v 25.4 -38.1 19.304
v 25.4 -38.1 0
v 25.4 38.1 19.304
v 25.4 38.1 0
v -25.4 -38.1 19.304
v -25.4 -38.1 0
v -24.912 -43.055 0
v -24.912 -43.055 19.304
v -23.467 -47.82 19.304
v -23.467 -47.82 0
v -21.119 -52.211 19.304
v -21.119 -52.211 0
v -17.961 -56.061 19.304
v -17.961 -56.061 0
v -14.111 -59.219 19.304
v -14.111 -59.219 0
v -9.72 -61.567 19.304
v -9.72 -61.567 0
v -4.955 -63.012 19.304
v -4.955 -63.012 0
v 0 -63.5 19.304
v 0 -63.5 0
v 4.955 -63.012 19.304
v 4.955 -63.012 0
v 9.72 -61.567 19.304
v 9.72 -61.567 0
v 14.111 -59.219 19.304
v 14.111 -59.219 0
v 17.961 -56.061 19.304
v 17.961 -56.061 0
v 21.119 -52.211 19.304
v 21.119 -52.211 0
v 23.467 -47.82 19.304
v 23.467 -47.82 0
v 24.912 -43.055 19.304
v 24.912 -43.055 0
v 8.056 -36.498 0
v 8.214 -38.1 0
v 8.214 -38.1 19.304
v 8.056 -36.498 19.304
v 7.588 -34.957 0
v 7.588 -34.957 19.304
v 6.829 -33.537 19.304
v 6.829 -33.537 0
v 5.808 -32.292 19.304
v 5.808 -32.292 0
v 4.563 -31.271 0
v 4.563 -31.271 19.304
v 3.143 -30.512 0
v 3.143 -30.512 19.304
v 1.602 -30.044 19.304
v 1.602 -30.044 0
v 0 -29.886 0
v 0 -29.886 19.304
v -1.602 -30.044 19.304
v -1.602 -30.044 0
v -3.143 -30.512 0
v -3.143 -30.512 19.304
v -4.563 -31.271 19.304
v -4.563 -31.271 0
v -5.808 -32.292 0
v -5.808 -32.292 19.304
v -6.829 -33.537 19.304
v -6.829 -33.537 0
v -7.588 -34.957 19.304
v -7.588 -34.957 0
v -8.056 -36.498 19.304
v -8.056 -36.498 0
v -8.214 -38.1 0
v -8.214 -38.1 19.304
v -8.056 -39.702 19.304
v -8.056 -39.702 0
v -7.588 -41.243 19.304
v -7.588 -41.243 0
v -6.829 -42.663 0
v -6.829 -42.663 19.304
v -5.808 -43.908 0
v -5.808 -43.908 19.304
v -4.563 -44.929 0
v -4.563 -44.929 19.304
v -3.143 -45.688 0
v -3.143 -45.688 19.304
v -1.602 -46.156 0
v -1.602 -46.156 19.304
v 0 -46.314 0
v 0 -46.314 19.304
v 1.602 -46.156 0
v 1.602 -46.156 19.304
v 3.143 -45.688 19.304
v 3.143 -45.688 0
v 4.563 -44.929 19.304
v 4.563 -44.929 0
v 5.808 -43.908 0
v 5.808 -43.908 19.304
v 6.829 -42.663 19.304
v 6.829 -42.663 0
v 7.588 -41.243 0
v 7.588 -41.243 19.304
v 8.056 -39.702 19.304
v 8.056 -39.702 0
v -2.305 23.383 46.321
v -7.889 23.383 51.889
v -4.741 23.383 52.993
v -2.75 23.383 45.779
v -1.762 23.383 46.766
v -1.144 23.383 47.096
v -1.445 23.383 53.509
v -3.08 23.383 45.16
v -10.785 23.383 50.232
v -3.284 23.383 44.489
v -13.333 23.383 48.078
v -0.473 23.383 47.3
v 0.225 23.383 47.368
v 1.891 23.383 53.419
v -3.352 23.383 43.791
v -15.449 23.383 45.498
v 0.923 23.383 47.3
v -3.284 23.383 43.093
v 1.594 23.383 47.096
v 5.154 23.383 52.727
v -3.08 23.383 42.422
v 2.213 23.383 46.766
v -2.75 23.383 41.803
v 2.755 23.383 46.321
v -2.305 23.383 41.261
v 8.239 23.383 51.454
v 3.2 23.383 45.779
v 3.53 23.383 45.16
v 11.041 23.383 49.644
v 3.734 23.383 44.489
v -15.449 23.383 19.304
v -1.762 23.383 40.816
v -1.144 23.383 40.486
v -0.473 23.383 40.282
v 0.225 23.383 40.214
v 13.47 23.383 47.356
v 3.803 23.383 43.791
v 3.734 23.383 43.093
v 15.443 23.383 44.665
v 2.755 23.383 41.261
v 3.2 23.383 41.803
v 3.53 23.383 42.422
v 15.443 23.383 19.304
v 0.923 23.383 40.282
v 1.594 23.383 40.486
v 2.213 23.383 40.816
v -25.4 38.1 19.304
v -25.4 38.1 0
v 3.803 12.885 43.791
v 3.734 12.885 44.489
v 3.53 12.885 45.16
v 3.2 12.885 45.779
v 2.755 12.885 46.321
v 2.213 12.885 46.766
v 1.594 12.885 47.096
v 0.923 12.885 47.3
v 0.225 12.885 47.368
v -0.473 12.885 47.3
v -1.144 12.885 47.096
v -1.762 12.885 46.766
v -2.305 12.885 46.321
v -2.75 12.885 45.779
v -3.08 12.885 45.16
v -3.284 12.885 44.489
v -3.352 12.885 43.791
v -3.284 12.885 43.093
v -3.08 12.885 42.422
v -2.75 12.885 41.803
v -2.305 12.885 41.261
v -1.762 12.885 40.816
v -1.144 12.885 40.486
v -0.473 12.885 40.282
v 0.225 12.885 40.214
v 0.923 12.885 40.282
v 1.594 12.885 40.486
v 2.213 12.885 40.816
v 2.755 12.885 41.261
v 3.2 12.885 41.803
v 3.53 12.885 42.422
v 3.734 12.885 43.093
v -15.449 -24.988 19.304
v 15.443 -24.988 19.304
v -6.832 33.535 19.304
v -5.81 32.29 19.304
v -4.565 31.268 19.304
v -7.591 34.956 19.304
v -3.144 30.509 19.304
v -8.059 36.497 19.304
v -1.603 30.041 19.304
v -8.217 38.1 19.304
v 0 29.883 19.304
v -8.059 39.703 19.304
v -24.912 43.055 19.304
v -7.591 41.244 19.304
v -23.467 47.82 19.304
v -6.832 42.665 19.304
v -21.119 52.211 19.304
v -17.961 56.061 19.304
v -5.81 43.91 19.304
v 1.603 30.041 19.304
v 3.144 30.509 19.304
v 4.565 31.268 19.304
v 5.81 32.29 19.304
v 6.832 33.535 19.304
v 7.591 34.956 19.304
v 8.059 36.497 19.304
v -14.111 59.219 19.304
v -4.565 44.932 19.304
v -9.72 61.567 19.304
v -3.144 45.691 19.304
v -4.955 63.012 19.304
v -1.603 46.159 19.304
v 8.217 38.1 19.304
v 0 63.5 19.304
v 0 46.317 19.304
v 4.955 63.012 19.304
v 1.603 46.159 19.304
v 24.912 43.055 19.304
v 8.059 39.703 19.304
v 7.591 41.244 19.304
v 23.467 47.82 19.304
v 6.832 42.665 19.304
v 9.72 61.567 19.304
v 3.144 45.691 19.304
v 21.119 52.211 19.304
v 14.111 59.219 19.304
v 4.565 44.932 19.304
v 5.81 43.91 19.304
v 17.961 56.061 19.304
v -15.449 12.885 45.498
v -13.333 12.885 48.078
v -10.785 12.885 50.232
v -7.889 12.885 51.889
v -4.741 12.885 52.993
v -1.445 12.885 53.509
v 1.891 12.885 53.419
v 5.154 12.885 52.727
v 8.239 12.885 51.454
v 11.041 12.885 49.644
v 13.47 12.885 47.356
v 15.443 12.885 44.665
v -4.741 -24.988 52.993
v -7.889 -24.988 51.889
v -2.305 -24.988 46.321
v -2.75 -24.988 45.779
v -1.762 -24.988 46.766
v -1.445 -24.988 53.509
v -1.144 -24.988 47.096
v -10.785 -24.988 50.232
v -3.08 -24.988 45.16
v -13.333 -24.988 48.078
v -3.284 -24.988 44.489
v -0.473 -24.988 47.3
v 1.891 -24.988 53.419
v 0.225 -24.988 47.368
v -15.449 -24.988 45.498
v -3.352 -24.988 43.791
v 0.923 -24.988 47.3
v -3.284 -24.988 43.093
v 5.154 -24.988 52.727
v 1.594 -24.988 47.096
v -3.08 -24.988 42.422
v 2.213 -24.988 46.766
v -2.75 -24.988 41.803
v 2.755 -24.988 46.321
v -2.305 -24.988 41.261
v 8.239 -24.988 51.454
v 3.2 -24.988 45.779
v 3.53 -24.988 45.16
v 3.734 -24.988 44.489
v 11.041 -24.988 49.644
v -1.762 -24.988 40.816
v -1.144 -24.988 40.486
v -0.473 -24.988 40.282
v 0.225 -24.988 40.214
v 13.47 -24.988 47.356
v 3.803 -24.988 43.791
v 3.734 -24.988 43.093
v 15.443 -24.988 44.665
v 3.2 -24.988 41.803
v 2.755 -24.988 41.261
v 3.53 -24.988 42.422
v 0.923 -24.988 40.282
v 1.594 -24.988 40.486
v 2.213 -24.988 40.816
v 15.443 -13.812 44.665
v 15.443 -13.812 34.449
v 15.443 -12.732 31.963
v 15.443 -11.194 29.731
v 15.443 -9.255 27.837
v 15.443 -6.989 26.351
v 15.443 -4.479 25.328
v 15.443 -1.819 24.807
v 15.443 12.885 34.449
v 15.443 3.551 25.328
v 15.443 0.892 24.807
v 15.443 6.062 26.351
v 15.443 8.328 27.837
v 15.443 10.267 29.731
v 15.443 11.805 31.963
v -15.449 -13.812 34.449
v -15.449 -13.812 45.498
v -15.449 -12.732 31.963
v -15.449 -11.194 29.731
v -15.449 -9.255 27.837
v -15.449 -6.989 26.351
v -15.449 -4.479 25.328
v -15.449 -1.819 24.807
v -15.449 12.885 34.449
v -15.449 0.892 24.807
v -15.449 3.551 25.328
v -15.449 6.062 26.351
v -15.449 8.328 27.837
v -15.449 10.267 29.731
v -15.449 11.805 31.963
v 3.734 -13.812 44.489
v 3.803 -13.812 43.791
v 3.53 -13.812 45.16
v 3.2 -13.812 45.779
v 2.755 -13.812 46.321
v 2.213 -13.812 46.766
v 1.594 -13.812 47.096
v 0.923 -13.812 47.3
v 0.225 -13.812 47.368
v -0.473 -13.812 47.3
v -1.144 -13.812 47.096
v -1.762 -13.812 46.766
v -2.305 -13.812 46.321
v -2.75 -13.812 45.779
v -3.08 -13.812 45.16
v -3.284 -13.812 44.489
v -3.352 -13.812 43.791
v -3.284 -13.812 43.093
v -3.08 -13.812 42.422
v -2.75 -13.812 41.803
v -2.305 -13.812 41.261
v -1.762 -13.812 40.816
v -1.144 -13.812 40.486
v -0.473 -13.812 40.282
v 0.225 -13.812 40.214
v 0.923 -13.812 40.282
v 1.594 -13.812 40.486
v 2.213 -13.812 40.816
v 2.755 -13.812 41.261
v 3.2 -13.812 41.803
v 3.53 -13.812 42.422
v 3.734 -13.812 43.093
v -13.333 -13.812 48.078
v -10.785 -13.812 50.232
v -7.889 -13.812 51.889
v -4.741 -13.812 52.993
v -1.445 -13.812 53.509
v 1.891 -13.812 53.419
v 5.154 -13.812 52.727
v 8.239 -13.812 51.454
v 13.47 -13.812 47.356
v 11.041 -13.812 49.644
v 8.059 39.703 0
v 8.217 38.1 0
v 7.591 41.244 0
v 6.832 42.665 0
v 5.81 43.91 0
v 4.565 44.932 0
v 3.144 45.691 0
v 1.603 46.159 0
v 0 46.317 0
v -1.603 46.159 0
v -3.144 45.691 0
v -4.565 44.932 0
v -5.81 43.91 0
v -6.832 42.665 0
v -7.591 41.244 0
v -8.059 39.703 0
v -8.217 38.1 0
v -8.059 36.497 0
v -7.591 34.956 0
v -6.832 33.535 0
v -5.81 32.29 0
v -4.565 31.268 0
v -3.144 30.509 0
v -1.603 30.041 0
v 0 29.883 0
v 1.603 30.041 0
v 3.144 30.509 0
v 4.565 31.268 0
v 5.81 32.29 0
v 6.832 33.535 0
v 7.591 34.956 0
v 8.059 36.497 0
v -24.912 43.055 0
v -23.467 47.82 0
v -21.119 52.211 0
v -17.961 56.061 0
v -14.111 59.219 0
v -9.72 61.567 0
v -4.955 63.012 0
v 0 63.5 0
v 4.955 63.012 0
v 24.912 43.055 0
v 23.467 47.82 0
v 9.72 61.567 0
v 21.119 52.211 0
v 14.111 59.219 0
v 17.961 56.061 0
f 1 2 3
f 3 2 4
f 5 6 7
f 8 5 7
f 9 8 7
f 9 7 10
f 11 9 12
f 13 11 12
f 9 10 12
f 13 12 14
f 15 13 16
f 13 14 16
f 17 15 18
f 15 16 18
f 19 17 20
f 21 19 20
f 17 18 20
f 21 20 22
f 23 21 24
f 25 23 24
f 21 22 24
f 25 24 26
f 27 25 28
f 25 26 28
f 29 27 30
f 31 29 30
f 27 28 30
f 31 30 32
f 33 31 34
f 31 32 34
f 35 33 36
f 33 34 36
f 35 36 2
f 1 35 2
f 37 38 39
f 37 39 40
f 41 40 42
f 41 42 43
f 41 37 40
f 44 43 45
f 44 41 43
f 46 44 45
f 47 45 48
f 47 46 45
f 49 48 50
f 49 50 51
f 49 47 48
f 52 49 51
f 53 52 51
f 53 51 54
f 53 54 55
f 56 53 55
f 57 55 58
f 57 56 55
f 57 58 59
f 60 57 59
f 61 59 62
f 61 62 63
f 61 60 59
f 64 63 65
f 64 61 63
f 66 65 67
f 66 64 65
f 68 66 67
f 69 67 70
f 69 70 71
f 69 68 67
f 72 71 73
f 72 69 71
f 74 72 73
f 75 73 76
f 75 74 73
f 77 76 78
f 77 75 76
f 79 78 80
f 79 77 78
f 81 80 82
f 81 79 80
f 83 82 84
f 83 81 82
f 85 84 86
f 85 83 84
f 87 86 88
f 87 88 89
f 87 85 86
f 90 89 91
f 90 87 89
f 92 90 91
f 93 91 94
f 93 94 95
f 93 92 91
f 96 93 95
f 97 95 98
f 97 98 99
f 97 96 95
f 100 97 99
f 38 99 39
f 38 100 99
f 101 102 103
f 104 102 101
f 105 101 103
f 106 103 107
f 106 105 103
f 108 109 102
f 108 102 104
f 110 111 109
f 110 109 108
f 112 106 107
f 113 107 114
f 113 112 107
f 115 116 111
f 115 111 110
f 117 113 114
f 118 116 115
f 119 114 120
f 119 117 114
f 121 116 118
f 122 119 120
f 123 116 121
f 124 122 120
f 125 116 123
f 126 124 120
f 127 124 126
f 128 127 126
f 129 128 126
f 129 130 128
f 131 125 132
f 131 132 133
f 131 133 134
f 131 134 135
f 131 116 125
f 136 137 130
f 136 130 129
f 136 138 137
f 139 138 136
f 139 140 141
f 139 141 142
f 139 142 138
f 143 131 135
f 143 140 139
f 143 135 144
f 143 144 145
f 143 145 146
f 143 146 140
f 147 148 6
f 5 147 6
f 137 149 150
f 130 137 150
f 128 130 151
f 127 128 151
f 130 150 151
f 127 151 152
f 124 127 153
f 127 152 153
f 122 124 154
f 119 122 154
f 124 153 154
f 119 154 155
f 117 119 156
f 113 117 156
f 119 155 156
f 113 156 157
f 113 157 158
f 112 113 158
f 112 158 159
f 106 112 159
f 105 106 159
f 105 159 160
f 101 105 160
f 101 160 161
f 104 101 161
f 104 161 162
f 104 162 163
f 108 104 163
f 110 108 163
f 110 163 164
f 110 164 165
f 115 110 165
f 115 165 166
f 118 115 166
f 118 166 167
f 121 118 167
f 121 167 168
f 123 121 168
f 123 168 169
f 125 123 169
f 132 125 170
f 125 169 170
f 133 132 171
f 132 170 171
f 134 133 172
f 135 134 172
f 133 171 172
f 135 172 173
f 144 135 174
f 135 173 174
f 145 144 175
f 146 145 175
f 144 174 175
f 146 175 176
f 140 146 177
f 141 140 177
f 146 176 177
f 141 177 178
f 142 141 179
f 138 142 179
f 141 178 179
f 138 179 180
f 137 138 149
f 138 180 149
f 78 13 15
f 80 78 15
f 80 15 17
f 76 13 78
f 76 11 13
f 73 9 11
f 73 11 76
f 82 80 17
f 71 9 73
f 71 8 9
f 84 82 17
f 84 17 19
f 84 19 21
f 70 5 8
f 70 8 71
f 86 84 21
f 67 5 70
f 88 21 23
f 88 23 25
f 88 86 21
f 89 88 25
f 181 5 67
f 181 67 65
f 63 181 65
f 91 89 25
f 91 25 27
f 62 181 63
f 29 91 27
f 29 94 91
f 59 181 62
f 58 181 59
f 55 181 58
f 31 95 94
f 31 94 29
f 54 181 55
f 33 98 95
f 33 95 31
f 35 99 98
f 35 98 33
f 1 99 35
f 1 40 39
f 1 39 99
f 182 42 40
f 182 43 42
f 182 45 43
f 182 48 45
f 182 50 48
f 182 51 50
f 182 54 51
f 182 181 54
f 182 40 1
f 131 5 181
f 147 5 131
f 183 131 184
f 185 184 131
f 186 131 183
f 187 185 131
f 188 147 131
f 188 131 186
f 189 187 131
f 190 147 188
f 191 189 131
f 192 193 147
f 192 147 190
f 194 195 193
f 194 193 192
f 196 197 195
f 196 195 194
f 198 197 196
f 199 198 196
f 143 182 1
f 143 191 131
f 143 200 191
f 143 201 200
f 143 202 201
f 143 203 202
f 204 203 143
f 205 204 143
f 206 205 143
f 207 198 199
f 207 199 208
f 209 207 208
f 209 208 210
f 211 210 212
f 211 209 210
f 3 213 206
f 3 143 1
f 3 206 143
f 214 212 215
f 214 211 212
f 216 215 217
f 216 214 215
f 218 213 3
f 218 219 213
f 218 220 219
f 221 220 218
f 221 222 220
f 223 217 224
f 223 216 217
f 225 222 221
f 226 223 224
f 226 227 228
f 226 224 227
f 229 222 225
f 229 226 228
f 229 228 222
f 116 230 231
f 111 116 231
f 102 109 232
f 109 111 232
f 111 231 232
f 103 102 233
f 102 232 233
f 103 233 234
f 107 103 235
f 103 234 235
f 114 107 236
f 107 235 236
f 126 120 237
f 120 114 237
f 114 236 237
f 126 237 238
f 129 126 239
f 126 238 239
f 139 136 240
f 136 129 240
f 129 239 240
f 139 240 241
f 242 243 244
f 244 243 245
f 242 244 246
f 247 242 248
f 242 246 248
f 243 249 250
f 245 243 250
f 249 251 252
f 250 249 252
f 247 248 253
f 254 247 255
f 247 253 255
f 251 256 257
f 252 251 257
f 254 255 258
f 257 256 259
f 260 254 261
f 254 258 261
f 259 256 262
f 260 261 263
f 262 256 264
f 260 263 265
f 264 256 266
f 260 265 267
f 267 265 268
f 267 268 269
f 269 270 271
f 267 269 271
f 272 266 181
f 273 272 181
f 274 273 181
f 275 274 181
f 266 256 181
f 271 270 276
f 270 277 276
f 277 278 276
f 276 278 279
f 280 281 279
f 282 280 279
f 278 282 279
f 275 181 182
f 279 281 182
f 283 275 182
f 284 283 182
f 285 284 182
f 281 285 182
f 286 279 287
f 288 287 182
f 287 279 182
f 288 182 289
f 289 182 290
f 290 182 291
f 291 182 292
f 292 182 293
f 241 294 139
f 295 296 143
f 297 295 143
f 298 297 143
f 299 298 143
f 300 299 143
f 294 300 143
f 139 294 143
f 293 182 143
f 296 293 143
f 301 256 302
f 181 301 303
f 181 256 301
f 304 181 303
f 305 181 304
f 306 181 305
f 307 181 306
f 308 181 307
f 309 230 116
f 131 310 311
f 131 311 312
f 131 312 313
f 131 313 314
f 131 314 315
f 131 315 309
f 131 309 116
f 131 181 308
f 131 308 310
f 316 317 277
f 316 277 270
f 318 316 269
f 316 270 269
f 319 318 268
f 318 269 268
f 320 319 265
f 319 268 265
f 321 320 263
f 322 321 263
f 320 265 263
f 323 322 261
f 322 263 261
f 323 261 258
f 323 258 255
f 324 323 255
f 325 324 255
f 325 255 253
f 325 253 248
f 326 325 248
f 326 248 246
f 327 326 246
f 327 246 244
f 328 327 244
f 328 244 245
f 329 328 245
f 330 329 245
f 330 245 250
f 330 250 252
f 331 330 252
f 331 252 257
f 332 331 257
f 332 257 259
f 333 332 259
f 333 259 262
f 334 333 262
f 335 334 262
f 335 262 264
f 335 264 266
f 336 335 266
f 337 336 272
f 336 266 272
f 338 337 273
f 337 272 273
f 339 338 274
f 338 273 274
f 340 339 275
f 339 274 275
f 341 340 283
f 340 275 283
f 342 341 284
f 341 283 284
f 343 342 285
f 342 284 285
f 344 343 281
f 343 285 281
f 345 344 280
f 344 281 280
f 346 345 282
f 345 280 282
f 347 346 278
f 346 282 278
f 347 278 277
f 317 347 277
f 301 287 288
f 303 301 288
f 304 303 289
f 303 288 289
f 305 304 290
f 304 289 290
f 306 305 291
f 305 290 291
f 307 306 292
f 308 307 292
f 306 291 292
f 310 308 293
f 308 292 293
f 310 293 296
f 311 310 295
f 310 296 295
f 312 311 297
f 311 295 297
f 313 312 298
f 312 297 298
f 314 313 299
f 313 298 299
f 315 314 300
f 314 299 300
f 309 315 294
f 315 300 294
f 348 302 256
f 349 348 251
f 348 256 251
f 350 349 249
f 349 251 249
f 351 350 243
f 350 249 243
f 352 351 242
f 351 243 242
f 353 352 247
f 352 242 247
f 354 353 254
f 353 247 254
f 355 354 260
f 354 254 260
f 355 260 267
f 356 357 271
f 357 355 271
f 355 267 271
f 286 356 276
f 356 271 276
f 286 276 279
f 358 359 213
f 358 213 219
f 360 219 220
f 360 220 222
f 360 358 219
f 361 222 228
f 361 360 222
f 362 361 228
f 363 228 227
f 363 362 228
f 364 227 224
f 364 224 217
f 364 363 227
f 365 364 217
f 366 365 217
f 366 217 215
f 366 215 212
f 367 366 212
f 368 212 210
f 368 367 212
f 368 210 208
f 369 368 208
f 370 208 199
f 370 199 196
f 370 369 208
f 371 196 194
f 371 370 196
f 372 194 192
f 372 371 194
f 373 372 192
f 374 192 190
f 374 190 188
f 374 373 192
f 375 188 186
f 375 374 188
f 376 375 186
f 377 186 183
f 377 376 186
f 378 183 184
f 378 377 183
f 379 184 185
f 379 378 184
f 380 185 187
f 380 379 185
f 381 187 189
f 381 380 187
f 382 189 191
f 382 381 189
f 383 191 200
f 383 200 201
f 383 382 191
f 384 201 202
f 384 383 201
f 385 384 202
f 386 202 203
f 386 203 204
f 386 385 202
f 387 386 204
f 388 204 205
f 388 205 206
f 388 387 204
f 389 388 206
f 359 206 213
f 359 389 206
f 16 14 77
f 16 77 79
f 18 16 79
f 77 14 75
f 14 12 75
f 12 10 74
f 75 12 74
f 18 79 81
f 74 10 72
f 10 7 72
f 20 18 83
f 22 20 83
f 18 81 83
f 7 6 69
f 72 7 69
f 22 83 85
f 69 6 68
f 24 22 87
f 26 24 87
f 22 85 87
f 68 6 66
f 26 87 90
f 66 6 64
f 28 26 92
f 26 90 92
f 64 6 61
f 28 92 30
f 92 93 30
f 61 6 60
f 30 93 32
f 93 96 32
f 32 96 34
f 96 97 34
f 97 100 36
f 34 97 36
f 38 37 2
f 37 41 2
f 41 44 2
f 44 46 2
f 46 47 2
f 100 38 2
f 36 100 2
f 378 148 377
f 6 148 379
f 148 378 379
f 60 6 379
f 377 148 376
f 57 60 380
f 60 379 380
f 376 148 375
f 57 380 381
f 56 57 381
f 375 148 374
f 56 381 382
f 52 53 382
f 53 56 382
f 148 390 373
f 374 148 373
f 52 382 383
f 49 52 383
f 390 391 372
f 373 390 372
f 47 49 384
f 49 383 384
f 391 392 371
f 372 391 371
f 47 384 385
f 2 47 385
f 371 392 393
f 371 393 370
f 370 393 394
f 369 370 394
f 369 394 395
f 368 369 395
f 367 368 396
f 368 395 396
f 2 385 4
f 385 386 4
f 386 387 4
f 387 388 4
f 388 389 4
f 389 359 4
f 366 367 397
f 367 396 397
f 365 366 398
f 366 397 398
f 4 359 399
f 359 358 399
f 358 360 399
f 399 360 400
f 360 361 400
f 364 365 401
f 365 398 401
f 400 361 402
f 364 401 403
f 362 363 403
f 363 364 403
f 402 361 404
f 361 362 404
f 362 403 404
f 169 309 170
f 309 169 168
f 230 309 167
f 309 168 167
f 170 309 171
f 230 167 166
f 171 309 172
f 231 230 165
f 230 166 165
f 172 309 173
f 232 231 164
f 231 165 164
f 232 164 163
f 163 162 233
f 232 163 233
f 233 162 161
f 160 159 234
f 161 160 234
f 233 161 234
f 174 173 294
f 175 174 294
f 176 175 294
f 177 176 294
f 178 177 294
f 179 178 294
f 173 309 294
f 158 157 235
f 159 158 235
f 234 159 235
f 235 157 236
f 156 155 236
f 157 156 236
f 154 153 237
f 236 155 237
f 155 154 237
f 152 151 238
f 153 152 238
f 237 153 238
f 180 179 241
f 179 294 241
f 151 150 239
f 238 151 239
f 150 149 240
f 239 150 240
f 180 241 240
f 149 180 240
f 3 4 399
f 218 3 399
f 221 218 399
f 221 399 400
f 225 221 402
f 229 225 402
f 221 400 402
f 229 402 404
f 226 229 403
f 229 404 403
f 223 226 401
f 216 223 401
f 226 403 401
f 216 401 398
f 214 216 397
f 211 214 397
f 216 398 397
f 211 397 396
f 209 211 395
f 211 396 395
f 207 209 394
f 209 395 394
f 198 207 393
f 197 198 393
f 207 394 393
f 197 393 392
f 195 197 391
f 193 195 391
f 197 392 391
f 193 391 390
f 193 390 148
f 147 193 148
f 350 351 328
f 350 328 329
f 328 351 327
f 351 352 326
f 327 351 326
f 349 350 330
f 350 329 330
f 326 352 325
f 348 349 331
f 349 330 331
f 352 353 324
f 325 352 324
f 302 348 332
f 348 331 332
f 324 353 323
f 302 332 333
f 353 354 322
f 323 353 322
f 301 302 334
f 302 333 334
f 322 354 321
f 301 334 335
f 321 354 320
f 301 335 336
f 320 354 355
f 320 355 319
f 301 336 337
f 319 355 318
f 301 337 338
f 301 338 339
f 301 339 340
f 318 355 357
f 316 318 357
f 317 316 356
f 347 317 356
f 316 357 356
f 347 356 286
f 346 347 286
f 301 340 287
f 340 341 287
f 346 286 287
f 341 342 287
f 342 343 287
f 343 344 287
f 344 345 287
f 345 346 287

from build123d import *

# Parameters (mm, degrees)
F0_R      = 8.2136813159
F0_R_2    = 8.2169
F1_DEPTH  = 19.304
F2_W      = 42.0680484259
F2_H      = 48.3717918396
F3_DEPTH  = 34.29
F4_DEPTH  = 5.588
F5_DEPTH  = 5.588
F8_DEPTH  = 34.29
F9_DEPTH  = 60.198
F10_R     = 3.577492803
F11_DEPTH = 65.786


# Not quite as in the source:
# - a feature names something its author has since deleted; it is built from what else it names


with BuildPart() as f1:
    # F0 (on Top) → F1 (new body)
    with BuildSketch(Plane.XY):
        with BuildLine():
            Line((25.4, -38.1), (25.4, 38.1))
            ThreePointArc((25.4, 38.1), (0, 12.7), (-25.4, 38.1))
            Line((-25.4, 38.1), (-25.4, -38.1))
            ThreePointArc((-25.4, -38.1), (0, -12.7), (25.4, -38.1))
        make_face()
        with BuildLine():
            ThreePointArc((-25.4, -38.1), (0, -63.5), (25.4, -38.1))
            ThreePointArc((25.4, -38.1), (0, -12.7), (-25.4, -38.1))
        make_face()
        with Locations((0, -38.1)):
            Circle(F0_R, mode=Mode.SUBTRACT)
        with BuildLine():
            ThreePointArc((-25.4, 38.1), (0, 12.7), (25.4, 38.1))
            ThreePointArc((25.4, 38.1), (0, 63.5), (-25.4, 38.1))
        make_face()
        with Locations((0, 38.1)):
            Circle(F0_R_2, mode=Mode.SUBTRACT)
    extrude(amount=F1_DEPTH)

    # F2 (on face) → F3 (join)
    with BuildSketch(Plane.XY.offset(19.304)):
        with Locations((-0.0028242129, -0.8024219424)):
            Rectangle(F2_W, F2_H)
    extrude(amount=F3_DEPTH)

    # F4 (cut): a face of the model
    f4_faces = [f1.faces().sort_by_distance(p)[0] for p in [
        (21.0312, -0.8024219424, 36.449),
    ]]
    extrude(f4_faces, amount=-F4_DEPTH, mode=Mode.SUBTRACT)

    # F5 (cut): a face of the model
    f5_faces = [f1.faces().sort_by_distance(p)[0] for p in [
        (-21.0368484259, -0.8024219424, 36.449),
    ]]
    extrude(f5_faces, amount=-F5_DEPTH, mode=Mode.SUBTRACT)

    # F7 (on face) → F8 (cut)
    with BuildSketch(Plane.YZ.offset(15.4432)):
        with BuildLine():
            Line((12.8851897717, 53.594), (-13.8123355974, 53.594))
            Line((-13.8123355974, 53.594), (-13.8123355974, 34.4488508999))
            ThreePointArc((-13.8123355974, 34.4488508999), (-0.4635729128, 24.7413409198), (12.8851897717, 34.4488508999))
            Line((12.8851897717, 34.4488508999), (12.8851897717, 53.594))
        make_face()
    extrude(amount=-F8_DEPTH, mode=Mode.SUBTRACT)

    # F6 (on face) → F9 (cut)
    with BuildSketch(Plane.XZ.offset(24.9883178622)):
        with BuildLine():
            ThreePointArc((-15.4488484259, 45.4977191985), (0.2250638301, 53.5401239092), (15.4432, 44.6654334664))
            Line((15.4432, 44.6654334664), (15.4432, 53.594))
            Line((15.4432, 53.594), (-15.4488484259, 53.594))
            Line((-15.4488484259, 53.594), (-15.4488484259, 45.4977191985))
        make_face()
    extrude(amount=-F9_DEPTH, mode=Mode.SUBTRACT)

    # F10 (on face) → F11 (cut)
    with BuildSketch(Plane.XZ.offset(24.9883178622)):
        with Locations((0.2250638301, 43.7909998)):
            Circle(F10_R)
    extrude(amount=-F11_DEPTH, mode=Mode.SUBTRACT)


solid = f1.part
